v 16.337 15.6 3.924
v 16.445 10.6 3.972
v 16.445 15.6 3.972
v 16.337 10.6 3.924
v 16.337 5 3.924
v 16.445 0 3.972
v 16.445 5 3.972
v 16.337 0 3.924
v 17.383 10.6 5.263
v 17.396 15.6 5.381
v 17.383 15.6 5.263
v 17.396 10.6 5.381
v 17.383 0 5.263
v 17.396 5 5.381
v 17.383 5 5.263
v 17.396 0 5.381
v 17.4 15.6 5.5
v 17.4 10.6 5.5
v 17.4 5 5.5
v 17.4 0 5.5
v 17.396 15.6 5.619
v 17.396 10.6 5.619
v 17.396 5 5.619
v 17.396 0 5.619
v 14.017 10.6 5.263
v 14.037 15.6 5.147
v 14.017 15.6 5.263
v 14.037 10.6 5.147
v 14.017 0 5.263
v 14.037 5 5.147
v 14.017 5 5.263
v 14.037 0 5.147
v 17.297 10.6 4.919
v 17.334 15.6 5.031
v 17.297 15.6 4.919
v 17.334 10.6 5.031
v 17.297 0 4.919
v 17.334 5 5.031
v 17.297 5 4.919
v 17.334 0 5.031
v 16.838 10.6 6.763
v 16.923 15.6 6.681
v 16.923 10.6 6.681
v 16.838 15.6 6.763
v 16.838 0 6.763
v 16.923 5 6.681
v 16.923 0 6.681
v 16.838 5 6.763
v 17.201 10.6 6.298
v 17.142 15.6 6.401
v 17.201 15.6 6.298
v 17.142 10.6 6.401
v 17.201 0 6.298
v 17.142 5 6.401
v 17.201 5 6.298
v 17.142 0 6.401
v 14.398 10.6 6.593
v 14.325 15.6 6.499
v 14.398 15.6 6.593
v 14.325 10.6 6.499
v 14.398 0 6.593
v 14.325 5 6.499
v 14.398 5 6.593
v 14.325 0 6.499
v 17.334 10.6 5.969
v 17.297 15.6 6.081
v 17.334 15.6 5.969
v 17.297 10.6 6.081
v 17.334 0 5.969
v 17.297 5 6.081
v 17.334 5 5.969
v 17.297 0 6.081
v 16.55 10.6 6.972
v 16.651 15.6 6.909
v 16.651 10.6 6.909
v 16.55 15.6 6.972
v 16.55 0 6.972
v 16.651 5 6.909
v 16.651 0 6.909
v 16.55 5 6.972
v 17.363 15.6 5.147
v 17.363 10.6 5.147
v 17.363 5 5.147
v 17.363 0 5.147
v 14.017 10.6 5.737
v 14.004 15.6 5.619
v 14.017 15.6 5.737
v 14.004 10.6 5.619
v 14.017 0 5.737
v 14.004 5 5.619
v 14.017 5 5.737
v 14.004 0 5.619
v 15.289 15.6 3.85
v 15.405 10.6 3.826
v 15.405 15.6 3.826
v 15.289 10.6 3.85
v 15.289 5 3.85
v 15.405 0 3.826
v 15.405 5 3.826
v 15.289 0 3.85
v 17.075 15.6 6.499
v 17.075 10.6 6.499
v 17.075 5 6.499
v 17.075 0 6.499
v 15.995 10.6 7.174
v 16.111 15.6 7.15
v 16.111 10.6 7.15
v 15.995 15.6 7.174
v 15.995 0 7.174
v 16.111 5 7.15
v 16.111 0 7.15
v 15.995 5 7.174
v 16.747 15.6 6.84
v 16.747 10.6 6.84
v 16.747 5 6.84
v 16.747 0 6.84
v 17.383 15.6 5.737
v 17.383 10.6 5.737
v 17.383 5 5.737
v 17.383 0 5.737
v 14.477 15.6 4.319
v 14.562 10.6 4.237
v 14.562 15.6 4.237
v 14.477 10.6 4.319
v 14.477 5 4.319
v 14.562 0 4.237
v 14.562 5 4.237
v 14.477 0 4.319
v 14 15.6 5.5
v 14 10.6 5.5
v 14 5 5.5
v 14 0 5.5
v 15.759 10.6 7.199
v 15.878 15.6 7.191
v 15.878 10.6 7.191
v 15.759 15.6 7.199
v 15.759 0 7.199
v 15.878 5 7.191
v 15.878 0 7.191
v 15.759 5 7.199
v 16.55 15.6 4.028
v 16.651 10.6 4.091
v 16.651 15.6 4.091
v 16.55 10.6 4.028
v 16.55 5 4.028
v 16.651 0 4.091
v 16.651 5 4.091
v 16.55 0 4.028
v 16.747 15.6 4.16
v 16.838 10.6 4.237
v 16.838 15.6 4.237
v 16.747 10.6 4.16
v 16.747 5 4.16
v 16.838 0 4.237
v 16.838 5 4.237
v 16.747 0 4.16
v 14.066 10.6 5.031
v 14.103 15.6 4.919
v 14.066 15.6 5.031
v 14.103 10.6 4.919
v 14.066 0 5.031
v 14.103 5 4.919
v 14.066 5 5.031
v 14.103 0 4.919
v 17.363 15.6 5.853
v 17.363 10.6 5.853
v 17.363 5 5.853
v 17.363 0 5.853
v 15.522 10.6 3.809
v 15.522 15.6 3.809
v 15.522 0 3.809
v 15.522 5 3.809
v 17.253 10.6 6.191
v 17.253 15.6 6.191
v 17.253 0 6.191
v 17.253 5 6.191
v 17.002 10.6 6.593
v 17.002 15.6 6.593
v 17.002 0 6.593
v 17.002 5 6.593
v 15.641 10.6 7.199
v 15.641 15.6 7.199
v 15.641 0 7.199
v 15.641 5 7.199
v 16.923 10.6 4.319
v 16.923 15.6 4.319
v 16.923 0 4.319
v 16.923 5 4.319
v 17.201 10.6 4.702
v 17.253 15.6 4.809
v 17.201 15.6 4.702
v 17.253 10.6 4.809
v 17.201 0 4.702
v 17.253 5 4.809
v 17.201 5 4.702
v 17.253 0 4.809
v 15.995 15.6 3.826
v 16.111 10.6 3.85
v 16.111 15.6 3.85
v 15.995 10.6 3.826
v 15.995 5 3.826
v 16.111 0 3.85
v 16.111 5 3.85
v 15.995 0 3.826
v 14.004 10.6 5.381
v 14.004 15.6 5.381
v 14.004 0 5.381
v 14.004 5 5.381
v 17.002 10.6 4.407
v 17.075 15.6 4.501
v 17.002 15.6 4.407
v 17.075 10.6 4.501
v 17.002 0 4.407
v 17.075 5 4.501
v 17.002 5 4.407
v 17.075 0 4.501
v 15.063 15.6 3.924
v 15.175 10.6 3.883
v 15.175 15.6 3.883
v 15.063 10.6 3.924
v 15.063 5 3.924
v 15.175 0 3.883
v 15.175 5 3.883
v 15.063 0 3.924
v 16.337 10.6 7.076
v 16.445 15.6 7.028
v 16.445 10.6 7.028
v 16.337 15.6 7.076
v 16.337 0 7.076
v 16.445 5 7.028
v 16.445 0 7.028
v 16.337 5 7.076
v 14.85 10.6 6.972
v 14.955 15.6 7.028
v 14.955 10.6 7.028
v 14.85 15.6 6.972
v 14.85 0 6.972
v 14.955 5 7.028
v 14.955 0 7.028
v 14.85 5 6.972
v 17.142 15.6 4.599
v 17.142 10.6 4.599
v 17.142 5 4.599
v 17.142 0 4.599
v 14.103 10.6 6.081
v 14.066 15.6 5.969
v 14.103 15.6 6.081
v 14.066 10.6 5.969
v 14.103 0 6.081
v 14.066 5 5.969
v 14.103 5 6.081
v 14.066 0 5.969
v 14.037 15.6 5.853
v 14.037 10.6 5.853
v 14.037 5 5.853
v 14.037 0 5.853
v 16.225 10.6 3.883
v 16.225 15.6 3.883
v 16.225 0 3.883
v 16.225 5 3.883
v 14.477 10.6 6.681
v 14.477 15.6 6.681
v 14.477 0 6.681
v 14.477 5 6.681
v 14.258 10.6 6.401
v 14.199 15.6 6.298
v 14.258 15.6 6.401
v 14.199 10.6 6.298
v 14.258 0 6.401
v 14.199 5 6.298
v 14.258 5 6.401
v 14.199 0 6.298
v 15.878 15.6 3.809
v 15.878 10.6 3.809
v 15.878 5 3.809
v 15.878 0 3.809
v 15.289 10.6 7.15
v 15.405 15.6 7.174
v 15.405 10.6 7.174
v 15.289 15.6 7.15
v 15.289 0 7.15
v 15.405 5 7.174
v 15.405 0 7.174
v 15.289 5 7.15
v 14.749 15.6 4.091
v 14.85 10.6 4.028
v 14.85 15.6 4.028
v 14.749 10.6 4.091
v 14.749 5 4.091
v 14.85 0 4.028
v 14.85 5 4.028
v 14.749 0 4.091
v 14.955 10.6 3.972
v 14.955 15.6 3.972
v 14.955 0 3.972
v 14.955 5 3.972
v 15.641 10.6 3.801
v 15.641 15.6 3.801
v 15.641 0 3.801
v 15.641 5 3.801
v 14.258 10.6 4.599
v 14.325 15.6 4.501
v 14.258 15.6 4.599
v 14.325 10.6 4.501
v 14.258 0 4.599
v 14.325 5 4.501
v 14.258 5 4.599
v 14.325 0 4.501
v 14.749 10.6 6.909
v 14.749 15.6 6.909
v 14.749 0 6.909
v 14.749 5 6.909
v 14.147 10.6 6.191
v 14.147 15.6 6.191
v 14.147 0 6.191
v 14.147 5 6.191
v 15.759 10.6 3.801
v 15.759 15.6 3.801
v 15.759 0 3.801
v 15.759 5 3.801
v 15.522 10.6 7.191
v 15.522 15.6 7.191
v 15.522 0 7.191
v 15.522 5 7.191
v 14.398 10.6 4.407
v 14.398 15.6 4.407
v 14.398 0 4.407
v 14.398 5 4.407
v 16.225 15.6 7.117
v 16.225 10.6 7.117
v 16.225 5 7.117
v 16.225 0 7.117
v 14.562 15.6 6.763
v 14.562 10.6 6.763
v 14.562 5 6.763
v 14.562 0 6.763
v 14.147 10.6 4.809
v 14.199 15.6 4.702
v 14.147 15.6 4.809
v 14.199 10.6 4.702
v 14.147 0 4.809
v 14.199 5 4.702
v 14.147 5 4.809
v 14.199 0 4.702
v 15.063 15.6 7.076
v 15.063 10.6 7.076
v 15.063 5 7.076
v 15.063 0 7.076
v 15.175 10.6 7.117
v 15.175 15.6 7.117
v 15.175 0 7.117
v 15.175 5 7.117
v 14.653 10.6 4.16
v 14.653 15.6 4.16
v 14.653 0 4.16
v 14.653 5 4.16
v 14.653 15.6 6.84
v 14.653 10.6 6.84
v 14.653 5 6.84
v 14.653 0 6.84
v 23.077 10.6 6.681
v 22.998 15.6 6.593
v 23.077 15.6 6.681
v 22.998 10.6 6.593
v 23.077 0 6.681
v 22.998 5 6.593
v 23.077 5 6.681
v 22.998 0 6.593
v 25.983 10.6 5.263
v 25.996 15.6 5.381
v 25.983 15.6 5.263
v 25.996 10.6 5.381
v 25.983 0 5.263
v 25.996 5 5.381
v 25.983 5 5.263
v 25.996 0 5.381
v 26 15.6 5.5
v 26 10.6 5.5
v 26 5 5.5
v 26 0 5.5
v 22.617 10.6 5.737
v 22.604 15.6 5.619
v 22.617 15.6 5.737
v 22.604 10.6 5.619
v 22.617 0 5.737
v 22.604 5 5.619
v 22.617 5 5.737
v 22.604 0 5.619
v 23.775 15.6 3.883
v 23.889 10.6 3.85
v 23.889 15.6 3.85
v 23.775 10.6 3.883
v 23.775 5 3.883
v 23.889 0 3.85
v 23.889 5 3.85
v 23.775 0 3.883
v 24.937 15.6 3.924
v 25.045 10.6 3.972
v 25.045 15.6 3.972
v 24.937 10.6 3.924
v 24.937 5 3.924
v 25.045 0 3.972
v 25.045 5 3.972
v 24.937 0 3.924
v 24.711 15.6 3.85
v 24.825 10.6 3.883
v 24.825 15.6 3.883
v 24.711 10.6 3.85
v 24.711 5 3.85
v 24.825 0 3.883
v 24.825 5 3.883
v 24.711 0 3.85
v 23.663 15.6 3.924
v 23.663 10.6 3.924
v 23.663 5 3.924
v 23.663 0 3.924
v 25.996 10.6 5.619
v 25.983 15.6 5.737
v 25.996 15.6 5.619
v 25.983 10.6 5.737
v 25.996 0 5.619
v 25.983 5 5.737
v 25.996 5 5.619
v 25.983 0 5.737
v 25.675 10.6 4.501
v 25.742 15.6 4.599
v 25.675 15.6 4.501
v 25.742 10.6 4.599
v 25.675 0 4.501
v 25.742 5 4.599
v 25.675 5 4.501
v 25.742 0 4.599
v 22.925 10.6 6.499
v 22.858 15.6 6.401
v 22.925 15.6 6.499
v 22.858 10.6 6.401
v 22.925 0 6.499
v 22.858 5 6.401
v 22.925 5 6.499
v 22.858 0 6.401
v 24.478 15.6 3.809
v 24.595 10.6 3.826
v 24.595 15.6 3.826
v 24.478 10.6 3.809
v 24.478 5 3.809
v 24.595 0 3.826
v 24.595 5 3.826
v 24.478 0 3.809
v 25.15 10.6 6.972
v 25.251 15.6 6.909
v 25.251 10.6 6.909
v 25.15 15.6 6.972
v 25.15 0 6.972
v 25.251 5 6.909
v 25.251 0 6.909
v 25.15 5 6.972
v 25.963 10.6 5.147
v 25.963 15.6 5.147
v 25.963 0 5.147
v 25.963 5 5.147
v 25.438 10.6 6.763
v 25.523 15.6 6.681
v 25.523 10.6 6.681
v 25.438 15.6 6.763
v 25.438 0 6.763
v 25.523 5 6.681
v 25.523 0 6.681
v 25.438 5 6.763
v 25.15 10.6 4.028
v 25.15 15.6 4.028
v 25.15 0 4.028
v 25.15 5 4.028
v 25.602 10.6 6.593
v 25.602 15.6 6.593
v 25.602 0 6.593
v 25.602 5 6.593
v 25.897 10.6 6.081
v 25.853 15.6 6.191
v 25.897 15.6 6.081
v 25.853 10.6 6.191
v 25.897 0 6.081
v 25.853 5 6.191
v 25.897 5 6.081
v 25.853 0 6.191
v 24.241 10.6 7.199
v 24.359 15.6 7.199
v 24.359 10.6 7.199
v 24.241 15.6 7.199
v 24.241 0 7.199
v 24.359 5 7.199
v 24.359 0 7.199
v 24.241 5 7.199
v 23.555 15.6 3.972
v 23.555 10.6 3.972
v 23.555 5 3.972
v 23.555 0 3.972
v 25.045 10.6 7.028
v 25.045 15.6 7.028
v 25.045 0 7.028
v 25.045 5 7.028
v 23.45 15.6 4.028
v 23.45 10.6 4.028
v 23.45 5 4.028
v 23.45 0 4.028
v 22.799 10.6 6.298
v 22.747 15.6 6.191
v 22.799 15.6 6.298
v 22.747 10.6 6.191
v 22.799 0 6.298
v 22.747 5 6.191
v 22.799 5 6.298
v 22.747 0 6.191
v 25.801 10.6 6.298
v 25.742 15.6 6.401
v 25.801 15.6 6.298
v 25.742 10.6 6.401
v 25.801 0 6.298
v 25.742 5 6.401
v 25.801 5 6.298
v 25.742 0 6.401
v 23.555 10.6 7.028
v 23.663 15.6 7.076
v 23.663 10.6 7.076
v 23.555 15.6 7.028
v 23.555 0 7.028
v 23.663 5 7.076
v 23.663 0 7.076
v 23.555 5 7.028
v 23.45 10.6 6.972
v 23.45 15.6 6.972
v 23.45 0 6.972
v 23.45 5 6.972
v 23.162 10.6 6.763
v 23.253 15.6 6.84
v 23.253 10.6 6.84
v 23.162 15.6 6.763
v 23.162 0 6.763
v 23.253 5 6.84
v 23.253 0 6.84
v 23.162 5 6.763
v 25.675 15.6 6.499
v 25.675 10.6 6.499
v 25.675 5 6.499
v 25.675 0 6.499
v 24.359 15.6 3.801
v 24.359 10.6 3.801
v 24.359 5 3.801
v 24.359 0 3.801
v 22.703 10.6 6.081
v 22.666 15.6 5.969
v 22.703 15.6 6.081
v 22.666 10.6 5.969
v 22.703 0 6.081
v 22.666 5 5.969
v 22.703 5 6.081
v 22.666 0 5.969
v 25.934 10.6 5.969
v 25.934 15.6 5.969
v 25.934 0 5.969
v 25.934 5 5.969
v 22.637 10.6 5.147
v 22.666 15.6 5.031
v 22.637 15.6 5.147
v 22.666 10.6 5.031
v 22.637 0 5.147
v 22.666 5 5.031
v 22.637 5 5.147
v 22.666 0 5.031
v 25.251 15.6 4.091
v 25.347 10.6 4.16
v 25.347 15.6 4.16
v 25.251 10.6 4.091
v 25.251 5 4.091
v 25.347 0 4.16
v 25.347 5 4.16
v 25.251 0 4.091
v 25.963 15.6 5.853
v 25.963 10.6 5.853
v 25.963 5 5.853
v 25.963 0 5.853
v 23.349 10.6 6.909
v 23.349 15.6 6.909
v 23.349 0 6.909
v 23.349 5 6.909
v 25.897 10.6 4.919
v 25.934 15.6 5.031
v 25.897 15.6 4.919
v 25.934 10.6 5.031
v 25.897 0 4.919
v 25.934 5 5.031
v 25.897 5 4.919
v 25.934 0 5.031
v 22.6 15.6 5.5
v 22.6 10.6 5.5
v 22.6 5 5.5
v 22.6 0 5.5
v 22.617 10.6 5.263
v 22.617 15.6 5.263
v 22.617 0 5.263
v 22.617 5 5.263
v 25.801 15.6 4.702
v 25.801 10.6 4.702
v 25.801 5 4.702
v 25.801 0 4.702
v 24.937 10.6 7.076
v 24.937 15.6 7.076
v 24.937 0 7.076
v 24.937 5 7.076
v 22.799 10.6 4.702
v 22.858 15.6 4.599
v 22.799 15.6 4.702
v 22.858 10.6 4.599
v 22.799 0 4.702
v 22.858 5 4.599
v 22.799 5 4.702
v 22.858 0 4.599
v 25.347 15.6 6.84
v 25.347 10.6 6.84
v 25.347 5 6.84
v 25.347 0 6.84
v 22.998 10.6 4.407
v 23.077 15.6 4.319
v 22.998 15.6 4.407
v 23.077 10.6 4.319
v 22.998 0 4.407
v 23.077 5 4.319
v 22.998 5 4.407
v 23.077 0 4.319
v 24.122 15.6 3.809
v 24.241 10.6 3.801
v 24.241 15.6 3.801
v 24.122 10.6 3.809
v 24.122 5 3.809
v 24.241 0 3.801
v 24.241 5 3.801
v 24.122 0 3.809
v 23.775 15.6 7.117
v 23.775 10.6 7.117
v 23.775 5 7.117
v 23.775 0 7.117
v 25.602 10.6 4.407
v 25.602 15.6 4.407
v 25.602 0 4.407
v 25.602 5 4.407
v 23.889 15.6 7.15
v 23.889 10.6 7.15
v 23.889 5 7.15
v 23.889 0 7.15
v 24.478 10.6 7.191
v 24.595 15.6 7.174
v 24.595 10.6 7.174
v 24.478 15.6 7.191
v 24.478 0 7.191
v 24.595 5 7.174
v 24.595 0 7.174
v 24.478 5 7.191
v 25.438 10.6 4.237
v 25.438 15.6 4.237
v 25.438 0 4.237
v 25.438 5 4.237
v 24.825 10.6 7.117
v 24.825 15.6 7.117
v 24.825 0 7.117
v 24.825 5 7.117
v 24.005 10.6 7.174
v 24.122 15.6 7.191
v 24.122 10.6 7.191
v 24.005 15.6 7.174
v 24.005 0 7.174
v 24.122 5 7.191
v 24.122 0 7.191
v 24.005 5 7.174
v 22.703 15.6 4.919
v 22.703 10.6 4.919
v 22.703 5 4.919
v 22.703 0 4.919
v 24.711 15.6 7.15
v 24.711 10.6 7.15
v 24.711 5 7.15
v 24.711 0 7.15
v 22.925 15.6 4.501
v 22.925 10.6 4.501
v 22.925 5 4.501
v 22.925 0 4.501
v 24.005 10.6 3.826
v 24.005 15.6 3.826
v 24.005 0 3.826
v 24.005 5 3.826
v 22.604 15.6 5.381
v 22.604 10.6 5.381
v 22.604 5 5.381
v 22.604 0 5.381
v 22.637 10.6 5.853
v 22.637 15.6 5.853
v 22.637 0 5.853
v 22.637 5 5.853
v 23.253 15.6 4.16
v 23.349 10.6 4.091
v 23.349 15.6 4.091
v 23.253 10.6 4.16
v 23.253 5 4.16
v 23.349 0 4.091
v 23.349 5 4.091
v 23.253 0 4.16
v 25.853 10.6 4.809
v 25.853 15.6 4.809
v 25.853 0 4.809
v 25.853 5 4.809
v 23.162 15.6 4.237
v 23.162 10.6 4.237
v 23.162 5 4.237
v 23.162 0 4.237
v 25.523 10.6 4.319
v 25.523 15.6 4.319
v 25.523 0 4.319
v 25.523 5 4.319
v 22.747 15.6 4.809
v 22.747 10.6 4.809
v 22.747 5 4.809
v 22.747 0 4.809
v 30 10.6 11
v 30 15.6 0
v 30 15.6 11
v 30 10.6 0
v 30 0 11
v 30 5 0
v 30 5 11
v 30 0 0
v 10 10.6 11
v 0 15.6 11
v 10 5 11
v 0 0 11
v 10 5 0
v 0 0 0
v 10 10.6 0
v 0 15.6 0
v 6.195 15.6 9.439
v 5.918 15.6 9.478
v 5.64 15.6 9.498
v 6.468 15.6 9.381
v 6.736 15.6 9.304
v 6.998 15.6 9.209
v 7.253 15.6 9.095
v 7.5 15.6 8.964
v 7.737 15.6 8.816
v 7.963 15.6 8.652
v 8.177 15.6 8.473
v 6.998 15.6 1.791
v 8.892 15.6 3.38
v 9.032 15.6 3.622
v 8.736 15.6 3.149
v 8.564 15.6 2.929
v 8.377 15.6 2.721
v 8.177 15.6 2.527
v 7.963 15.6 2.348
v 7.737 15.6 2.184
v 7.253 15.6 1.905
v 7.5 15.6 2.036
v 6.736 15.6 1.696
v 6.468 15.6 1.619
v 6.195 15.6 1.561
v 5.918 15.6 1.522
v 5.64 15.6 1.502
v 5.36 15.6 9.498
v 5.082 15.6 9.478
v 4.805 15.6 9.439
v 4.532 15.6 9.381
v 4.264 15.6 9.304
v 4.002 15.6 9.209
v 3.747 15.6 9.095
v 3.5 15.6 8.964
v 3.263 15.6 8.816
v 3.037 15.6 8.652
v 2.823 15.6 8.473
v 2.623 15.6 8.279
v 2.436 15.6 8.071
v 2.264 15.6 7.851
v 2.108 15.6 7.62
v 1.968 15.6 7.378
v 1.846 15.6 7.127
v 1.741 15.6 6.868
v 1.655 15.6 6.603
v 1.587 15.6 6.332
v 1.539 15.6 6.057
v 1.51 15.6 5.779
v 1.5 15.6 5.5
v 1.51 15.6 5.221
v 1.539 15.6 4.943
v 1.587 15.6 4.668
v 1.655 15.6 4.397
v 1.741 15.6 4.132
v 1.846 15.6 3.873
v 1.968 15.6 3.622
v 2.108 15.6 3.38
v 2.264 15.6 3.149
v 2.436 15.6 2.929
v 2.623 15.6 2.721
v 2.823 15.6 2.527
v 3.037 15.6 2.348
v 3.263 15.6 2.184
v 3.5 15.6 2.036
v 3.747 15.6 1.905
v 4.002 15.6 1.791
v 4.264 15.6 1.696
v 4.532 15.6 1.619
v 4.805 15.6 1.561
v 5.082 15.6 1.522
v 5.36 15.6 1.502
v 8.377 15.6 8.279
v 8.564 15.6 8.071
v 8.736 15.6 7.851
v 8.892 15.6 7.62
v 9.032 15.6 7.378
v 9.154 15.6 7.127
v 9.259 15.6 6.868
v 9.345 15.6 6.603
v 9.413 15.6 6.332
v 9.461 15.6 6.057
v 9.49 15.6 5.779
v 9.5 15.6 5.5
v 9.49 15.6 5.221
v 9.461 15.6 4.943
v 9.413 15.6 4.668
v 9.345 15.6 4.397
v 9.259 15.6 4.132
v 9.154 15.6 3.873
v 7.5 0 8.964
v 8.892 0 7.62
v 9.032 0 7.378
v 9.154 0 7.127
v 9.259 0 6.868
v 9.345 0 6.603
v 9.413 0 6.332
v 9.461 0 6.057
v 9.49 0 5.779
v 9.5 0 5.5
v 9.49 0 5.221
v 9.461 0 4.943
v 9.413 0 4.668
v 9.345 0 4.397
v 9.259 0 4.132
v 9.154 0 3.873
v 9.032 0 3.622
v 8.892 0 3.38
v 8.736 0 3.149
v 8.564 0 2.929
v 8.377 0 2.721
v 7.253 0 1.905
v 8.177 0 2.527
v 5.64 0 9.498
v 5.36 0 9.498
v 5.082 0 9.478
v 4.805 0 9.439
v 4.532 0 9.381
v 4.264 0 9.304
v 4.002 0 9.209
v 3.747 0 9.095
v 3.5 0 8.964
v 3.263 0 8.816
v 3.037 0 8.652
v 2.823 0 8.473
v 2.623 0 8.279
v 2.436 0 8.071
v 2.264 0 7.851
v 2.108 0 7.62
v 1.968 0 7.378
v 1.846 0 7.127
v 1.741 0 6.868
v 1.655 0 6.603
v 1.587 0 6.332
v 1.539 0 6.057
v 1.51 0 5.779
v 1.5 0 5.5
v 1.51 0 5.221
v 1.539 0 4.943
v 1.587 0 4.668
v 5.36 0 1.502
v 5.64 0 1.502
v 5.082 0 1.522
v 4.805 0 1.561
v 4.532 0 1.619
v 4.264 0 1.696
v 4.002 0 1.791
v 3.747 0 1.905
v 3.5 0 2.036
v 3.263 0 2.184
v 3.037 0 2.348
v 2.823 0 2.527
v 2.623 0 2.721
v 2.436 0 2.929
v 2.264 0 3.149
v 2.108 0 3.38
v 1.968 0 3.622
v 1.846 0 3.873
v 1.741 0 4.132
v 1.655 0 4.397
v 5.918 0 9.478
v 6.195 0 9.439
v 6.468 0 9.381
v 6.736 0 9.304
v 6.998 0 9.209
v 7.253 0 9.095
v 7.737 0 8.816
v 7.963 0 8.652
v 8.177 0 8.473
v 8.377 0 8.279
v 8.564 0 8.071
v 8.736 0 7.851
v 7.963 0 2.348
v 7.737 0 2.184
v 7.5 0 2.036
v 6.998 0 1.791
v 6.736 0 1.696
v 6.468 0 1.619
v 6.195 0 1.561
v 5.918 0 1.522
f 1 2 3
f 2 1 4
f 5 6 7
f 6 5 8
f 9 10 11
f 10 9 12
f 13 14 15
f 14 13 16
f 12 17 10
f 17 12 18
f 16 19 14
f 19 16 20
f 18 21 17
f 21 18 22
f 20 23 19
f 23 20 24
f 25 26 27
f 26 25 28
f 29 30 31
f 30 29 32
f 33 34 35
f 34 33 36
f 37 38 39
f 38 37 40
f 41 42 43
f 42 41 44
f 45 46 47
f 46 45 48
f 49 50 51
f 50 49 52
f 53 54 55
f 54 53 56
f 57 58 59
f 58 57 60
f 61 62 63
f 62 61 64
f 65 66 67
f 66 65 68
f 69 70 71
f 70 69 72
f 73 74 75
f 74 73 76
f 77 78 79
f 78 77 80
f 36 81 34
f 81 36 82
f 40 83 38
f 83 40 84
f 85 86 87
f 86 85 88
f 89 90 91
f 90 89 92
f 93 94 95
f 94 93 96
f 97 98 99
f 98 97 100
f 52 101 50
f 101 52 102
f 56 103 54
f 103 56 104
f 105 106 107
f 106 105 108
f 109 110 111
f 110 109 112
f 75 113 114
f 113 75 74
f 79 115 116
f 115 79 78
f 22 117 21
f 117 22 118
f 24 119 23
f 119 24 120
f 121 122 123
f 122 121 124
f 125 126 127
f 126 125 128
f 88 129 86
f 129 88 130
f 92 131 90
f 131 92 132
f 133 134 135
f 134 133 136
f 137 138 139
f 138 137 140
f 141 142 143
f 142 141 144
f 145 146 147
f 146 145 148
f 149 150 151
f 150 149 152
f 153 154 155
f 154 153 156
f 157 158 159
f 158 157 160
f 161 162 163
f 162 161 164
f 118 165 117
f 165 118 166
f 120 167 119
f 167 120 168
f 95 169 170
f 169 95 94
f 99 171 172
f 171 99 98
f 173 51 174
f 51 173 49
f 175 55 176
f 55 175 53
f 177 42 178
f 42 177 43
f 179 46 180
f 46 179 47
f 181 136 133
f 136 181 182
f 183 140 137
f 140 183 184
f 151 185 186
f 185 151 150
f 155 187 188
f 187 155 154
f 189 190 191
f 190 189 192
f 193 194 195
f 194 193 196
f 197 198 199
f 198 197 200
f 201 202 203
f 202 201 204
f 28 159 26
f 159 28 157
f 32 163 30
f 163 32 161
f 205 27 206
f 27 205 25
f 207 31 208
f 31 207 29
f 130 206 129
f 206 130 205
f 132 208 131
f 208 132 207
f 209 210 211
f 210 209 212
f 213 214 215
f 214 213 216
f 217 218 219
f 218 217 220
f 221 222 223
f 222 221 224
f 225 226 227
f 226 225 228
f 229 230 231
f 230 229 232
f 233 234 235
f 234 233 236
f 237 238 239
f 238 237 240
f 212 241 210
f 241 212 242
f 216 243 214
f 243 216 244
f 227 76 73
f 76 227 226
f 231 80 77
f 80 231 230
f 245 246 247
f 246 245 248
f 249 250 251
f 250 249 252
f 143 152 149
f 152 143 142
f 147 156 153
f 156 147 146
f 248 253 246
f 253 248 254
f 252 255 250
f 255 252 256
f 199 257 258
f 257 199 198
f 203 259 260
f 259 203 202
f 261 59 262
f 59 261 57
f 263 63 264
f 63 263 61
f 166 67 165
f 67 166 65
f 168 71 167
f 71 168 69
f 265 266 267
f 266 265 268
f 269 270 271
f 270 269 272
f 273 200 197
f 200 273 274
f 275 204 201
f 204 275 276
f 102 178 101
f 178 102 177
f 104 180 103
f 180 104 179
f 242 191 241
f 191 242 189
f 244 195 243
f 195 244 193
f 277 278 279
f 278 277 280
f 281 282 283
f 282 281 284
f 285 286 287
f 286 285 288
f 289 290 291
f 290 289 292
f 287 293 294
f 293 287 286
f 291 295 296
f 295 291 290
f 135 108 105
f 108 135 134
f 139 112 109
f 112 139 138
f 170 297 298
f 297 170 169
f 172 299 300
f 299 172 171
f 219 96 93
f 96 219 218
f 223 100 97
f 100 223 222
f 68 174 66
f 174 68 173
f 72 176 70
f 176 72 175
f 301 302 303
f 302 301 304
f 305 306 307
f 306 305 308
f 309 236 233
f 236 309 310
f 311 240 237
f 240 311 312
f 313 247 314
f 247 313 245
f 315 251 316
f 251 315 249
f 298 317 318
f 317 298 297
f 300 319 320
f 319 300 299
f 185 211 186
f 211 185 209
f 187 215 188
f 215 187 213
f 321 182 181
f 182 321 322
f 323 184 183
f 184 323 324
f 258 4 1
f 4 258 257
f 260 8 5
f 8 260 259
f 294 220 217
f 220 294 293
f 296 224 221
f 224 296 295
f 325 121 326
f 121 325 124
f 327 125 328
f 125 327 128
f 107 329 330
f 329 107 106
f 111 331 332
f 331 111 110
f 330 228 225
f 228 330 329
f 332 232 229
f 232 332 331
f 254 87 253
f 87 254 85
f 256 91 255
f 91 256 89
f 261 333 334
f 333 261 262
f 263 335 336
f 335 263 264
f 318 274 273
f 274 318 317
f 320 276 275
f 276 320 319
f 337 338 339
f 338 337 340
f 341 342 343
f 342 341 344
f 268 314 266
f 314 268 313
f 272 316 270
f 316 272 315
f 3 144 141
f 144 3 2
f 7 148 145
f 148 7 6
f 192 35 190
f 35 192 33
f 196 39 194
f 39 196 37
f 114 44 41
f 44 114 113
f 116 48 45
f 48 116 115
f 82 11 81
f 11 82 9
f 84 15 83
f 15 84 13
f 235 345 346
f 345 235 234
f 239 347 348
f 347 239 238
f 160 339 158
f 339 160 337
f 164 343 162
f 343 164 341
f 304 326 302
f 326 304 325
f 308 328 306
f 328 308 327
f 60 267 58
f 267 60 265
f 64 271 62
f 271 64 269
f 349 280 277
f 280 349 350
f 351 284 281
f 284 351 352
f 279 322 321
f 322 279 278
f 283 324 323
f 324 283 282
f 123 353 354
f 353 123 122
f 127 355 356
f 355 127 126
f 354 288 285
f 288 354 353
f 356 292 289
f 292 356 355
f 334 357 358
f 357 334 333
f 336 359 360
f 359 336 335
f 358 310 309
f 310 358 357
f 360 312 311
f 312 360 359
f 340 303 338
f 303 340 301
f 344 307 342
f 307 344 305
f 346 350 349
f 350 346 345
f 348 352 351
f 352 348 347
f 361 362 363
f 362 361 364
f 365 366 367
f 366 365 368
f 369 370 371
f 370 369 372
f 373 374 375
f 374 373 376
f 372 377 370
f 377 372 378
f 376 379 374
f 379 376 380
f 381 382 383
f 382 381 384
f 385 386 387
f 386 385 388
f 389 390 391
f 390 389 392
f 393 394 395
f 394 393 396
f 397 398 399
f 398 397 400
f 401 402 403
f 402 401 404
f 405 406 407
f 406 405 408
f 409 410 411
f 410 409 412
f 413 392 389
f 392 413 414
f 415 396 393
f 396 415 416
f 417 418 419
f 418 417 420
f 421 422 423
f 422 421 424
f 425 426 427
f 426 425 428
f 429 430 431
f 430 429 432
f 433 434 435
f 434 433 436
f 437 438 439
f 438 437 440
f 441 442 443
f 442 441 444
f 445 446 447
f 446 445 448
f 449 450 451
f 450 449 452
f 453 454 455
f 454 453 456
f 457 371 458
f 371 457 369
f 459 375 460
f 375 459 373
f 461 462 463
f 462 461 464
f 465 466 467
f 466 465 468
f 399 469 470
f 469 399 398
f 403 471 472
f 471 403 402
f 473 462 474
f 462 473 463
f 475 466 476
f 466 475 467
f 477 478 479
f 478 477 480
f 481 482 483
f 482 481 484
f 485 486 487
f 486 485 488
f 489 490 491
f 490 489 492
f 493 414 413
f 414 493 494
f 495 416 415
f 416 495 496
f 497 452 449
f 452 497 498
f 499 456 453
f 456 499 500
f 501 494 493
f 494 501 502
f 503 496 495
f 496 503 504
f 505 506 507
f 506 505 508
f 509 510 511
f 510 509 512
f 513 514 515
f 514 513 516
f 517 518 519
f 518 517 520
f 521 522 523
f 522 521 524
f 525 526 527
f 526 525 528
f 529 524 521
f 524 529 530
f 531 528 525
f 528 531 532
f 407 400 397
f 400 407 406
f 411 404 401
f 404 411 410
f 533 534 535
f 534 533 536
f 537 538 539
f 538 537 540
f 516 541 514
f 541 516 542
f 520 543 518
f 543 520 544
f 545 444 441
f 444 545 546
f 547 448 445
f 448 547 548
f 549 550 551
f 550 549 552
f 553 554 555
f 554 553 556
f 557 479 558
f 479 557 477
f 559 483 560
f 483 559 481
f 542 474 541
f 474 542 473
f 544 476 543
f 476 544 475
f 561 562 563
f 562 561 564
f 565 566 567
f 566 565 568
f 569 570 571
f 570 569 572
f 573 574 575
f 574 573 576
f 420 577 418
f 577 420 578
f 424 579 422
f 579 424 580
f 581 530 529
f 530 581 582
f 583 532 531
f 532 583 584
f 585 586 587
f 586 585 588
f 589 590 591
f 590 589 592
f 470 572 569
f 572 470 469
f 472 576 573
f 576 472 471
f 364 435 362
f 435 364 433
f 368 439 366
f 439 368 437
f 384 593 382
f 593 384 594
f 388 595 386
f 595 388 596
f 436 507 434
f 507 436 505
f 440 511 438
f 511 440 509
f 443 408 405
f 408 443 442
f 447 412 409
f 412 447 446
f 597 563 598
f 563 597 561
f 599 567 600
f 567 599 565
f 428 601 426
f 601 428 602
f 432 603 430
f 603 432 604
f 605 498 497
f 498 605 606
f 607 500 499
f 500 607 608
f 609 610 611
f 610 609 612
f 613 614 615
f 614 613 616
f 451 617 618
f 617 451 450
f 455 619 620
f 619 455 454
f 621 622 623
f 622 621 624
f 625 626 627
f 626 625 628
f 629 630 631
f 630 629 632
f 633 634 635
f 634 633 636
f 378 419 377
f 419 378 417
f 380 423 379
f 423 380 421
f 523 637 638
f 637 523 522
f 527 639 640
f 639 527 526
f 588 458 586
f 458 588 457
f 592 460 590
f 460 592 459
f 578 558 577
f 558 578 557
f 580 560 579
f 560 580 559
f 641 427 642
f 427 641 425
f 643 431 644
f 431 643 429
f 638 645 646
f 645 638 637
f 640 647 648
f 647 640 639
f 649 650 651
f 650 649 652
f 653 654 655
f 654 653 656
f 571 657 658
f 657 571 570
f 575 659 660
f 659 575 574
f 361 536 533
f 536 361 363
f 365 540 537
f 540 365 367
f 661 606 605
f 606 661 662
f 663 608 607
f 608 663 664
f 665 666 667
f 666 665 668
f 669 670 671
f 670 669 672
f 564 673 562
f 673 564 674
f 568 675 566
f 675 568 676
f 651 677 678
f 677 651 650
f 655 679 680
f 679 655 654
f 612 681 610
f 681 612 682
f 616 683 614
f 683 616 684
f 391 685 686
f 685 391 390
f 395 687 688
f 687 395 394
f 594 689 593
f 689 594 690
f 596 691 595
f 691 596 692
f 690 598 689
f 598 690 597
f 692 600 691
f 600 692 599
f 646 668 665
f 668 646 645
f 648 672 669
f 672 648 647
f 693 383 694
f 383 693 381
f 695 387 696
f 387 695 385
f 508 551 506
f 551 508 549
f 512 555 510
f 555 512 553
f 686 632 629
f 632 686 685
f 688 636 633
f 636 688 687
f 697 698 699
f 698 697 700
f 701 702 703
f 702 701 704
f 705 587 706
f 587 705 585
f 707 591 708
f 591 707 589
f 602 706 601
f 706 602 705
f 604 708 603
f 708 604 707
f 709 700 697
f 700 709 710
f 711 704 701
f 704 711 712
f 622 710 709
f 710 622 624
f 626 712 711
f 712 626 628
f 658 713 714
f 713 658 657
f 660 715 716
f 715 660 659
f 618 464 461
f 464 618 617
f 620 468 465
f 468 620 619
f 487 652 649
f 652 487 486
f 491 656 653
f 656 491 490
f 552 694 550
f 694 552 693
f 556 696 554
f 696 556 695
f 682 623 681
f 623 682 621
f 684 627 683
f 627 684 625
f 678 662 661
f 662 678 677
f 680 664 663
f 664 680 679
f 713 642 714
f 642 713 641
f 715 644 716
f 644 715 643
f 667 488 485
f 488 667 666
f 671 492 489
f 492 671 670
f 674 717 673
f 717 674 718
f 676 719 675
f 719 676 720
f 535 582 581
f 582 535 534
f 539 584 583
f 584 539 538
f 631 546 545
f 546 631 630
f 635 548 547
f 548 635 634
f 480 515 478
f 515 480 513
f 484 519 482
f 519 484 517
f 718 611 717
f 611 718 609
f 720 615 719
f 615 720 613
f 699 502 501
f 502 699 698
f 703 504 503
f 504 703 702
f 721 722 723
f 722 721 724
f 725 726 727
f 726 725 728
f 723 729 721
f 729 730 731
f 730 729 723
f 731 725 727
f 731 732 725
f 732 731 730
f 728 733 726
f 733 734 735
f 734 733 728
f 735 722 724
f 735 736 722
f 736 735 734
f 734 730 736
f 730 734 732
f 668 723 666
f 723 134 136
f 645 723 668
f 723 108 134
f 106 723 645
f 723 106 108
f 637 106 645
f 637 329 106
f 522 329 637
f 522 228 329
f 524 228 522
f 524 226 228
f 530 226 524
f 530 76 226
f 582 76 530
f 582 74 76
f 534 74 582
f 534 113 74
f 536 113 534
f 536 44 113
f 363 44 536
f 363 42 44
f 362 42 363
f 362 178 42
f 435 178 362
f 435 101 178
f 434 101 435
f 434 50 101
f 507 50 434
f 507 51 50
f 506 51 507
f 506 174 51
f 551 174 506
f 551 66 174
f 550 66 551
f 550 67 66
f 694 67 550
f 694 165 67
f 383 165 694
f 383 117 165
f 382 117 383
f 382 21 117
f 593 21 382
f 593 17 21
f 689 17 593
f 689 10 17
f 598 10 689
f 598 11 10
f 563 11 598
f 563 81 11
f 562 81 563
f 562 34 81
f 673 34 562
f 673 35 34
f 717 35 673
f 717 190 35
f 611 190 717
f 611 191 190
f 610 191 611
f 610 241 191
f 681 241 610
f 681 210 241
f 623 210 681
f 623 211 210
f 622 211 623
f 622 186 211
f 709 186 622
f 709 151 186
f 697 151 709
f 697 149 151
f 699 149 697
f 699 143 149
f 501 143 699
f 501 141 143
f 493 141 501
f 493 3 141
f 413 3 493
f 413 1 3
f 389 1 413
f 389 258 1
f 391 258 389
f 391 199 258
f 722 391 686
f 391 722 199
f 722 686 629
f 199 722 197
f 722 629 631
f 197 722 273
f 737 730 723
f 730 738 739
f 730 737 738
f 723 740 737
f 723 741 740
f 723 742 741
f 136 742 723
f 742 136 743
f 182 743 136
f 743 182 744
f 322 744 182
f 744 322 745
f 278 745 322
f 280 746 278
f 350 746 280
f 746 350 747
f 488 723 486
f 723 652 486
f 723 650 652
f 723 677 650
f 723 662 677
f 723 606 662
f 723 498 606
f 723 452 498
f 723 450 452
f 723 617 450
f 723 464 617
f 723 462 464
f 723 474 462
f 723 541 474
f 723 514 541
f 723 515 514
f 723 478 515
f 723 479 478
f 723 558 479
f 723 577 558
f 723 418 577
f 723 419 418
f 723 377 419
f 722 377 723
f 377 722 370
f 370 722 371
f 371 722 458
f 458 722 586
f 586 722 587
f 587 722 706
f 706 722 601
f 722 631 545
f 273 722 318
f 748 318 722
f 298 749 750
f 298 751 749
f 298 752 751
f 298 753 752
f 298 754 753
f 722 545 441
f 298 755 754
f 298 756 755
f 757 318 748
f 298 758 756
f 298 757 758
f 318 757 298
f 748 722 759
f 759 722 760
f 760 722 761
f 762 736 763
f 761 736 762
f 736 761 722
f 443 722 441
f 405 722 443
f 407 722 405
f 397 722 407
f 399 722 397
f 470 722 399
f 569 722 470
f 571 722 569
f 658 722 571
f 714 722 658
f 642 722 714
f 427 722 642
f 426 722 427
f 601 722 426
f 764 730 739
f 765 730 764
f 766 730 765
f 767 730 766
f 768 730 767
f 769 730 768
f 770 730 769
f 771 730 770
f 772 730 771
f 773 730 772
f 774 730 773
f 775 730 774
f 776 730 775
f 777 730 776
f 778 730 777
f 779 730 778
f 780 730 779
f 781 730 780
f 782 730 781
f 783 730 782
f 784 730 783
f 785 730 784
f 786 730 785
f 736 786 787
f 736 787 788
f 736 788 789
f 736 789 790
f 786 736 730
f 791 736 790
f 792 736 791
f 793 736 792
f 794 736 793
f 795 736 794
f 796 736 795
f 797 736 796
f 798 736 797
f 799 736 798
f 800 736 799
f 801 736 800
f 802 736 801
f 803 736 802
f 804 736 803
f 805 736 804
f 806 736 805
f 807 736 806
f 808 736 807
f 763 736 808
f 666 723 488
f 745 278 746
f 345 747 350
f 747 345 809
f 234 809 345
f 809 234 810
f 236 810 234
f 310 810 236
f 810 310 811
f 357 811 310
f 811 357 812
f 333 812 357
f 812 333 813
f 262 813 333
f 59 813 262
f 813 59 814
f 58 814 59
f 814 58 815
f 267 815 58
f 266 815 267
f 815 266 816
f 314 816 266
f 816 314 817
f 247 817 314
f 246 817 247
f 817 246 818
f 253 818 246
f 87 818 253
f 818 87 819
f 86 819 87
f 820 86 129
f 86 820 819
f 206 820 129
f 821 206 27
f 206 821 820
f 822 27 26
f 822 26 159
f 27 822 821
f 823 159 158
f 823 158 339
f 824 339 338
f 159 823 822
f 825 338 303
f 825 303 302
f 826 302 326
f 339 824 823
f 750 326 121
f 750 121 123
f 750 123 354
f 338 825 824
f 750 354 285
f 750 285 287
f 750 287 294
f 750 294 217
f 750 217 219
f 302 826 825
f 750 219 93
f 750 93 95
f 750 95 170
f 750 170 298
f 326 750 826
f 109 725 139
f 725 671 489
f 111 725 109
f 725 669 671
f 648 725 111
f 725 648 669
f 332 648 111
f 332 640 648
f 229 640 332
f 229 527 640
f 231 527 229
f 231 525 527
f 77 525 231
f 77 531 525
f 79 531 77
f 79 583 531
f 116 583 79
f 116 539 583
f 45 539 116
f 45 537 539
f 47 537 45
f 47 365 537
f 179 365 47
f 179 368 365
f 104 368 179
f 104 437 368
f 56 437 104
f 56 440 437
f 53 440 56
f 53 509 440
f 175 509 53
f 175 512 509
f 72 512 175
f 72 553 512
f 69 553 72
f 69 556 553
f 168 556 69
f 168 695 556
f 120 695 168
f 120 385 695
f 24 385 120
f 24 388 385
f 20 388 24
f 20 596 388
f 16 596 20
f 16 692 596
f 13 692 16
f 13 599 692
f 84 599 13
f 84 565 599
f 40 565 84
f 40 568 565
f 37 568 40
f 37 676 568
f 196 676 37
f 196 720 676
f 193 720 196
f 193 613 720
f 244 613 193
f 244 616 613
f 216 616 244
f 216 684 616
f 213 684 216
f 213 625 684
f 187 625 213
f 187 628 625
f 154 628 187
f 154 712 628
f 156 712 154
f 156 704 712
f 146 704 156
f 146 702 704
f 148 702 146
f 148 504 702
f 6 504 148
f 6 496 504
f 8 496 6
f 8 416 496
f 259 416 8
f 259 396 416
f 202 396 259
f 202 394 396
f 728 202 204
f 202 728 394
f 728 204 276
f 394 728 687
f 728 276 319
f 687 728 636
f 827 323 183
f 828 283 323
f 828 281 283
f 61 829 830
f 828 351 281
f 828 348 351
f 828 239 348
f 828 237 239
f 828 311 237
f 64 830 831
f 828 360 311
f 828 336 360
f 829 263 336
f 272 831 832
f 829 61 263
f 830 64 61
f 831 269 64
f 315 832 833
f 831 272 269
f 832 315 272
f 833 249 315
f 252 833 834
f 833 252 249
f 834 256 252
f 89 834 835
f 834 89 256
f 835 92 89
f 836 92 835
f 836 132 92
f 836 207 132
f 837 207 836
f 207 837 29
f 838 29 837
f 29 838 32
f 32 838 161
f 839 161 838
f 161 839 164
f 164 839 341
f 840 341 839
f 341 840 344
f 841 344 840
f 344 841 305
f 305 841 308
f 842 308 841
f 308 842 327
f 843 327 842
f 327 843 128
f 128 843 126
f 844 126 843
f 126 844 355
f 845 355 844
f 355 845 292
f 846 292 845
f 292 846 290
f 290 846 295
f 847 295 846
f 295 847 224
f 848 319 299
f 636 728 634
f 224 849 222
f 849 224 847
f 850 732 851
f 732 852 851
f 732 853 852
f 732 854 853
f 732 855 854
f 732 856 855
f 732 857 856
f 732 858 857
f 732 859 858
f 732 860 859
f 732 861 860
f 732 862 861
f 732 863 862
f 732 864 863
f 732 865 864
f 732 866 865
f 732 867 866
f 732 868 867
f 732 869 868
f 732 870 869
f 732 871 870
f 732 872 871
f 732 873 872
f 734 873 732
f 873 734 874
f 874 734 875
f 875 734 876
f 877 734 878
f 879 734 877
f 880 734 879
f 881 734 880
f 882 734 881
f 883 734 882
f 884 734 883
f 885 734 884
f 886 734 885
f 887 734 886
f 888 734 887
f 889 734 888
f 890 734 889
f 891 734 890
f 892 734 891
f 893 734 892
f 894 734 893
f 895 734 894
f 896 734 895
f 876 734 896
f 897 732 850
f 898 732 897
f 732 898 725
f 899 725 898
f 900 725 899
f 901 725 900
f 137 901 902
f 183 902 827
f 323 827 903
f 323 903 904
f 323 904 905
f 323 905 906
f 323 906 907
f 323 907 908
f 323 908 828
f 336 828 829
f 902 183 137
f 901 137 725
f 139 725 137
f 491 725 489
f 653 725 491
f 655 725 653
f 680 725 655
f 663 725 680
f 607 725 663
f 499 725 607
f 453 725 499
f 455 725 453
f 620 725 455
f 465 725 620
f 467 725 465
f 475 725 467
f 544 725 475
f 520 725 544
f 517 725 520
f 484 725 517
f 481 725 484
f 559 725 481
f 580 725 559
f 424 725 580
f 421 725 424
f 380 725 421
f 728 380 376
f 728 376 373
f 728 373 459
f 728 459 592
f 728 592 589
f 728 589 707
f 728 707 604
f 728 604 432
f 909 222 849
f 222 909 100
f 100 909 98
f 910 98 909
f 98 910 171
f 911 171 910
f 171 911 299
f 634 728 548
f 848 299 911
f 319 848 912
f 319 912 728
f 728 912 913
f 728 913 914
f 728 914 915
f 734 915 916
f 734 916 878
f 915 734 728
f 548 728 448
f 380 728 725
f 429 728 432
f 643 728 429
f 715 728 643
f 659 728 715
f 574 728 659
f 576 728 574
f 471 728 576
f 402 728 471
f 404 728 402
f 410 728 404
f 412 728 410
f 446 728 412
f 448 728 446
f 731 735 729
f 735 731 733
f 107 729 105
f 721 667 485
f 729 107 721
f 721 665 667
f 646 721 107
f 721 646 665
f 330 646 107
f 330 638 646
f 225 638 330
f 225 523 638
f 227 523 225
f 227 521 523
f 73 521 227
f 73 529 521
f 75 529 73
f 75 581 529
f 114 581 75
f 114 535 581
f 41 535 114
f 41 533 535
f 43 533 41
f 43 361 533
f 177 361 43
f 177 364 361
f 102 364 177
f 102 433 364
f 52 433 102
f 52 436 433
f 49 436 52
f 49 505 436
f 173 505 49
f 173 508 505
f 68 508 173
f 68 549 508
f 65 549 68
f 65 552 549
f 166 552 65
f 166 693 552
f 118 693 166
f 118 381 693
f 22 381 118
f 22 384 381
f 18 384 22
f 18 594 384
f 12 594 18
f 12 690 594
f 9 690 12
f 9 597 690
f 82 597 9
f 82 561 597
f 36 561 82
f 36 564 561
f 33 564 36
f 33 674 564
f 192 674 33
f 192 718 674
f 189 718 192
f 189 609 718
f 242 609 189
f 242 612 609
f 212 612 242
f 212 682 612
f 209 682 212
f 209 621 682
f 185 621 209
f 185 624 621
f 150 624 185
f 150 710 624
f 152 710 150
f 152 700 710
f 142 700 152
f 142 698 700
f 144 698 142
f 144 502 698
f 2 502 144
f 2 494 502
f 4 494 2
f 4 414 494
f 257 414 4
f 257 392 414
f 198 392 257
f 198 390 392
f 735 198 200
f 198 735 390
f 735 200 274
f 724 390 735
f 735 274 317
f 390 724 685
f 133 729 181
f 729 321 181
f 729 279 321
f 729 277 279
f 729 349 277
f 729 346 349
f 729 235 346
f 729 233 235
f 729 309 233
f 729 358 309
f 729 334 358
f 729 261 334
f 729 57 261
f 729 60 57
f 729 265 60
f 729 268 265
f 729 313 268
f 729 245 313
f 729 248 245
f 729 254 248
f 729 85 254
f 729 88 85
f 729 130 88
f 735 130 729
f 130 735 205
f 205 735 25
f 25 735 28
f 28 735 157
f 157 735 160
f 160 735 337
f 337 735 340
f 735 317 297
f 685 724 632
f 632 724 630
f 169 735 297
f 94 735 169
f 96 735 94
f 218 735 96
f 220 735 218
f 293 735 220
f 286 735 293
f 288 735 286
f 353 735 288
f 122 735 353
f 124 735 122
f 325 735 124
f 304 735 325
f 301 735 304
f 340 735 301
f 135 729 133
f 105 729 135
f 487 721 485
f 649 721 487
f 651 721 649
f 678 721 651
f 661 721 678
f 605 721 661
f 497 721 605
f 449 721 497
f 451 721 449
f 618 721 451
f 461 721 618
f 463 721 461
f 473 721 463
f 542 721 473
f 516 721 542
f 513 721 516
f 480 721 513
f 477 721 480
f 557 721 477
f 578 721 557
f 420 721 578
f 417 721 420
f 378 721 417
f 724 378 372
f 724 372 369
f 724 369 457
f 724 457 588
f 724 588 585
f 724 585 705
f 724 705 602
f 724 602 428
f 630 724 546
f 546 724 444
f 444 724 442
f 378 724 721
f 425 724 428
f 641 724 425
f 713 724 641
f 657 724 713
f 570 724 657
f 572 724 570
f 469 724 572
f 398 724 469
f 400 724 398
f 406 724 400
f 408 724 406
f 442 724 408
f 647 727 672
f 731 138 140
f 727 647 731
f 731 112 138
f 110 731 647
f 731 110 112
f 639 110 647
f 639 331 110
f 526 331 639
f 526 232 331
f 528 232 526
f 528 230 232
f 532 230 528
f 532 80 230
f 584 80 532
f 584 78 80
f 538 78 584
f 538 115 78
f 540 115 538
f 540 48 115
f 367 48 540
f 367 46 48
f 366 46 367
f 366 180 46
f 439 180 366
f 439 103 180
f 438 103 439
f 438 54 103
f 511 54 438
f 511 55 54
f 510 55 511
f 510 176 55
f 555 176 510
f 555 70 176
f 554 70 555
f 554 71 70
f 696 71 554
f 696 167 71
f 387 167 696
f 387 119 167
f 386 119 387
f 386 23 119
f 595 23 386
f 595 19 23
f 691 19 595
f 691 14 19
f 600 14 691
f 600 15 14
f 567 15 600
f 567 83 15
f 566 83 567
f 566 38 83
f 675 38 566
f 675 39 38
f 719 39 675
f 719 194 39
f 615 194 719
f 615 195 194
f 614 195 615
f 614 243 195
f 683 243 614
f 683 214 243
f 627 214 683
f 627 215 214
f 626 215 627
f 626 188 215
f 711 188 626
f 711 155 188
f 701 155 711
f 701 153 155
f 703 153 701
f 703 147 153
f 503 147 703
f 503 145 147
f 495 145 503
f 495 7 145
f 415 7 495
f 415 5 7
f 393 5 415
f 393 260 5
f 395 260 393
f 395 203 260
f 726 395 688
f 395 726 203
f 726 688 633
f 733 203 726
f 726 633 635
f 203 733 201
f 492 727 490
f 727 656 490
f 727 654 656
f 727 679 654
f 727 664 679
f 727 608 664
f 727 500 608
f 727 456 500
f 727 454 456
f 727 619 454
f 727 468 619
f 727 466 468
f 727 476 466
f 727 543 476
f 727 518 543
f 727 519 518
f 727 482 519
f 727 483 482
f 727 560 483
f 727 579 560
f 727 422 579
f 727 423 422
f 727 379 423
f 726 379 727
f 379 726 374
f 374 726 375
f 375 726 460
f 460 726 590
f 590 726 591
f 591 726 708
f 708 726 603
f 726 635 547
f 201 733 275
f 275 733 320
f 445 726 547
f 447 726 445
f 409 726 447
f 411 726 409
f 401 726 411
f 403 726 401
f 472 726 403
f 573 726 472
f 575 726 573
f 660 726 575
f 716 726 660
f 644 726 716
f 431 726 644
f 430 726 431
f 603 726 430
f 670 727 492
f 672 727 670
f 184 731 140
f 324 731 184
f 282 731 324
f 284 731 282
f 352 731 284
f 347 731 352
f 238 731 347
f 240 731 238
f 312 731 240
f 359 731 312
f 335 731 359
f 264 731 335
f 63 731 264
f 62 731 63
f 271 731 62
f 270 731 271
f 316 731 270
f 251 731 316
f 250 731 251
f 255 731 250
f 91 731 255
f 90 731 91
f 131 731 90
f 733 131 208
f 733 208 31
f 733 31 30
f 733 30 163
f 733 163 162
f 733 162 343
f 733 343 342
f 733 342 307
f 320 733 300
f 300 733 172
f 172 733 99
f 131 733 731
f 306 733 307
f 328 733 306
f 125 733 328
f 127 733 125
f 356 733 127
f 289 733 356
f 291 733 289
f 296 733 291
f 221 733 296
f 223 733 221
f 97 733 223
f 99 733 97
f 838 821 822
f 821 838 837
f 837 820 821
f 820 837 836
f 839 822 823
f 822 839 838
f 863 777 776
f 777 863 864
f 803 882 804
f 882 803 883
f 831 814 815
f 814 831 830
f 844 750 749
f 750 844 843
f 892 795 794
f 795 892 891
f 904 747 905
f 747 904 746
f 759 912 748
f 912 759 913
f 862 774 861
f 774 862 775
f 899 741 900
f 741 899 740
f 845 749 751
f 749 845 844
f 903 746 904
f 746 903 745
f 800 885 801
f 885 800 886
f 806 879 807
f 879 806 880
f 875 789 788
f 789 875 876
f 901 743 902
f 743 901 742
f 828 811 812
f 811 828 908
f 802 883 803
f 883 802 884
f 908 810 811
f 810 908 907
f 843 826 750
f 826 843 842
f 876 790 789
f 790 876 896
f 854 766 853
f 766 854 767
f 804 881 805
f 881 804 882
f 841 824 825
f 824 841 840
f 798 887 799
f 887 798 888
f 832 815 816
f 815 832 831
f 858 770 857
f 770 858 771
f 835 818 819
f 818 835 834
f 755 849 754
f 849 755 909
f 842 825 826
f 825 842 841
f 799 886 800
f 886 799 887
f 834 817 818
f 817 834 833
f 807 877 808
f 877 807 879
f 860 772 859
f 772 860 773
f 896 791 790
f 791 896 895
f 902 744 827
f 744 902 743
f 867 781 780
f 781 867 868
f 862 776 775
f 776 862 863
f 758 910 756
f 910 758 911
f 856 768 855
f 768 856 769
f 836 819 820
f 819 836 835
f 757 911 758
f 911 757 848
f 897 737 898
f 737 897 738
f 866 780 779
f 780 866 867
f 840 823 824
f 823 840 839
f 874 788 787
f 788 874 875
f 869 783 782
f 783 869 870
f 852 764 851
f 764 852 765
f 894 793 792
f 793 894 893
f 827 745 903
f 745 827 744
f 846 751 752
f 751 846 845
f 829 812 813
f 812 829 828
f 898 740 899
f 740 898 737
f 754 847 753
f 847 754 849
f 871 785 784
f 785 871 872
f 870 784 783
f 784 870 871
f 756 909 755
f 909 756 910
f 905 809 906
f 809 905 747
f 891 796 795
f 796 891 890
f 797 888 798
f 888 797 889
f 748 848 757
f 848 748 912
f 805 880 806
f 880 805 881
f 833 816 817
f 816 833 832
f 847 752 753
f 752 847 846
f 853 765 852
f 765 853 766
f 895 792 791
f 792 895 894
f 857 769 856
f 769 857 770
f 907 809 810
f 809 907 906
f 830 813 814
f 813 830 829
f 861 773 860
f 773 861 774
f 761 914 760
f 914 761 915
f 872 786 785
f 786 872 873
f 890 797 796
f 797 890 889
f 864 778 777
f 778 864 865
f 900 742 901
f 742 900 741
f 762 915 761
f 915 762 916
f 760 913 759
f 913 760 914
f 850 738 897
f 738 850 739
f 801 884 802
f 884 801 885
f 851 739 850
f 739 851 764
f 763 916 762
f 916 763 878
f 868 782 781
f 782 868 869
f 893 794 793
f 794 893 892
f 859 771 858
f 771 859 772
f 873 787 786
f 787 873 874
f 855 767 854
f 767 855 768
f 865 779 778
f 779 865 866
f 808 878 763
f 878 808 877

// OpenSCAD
// durchmesser gewindestange. Absichtlich Knapp bemessen.
bohrung = 8;				// [2:0.1:16]

// Länge der gabelzinken
gabel = 20;				// [8:64]

// Stärke der Schenkel, die die Gabel formen.
wand = 5;				// [1:24]

// Materialstärke Rahmen, worauf Gabel geschoben wird
rahmen = 5.6;				// [2:0.1:16]

// Abmessung in Y-Richtung wenn montiert 
breite = 11;				// [4:32]

// Bohrung über Gabel
boden = 0.5;				// [0:0.1:20]

// diameter of holes for screws. Set to 0 for no holes
schraube = 3.4;				// [0:0.1:8]

// soweit werden Löcher für Schrauben eingerückt.
schraube_zum_rand = 4;			// [0:10]



schraube_radius = schraube/2;
bohrung_radius = bohrung/2;
dach = (breite-bohrung)/2;		
tiefe = wand+rahmen+wand;		// X-Richtung wenn montiert
hoehe = gabel+boden+bohrung+dach;	// Z-Richtung wenn montiert
// zur Verbesserung vom OpenSCAD Preview
little=0.01;				
$fn = 90;

module Wellenbock()  {
	difference()  {
		cube([hoehe, tiefe, breite]);					// Basis Block

		translate([dach+bohrung+boden, wand, -little/2])
		cube([gabel+little/2, rahmen, breite+little]);			// Gabel

		translate([dach+bohrung/2, -little/2, breite/2])
		rotate([-90, 0, 0])
		cylinder(tiefe+little, bohrung_radius, bohrung_radius);		// Bohrung für Welle

		if(schraube) {							// Bohrungen für Befestigungsschrauben
			for (x=[dach+bohrung+boden+schraube_radius+schraube_zum_rand,
			        hoehe-schraube_radius-schraube_zum_rand])  {  
				translate([x, -little/2, breite/2])
				rotate([-90, 0, 0])
				cylinder(tiefe+little, schraube_radius, schraube_radius);
			}
		}
	}
}			

Wellenbock();
